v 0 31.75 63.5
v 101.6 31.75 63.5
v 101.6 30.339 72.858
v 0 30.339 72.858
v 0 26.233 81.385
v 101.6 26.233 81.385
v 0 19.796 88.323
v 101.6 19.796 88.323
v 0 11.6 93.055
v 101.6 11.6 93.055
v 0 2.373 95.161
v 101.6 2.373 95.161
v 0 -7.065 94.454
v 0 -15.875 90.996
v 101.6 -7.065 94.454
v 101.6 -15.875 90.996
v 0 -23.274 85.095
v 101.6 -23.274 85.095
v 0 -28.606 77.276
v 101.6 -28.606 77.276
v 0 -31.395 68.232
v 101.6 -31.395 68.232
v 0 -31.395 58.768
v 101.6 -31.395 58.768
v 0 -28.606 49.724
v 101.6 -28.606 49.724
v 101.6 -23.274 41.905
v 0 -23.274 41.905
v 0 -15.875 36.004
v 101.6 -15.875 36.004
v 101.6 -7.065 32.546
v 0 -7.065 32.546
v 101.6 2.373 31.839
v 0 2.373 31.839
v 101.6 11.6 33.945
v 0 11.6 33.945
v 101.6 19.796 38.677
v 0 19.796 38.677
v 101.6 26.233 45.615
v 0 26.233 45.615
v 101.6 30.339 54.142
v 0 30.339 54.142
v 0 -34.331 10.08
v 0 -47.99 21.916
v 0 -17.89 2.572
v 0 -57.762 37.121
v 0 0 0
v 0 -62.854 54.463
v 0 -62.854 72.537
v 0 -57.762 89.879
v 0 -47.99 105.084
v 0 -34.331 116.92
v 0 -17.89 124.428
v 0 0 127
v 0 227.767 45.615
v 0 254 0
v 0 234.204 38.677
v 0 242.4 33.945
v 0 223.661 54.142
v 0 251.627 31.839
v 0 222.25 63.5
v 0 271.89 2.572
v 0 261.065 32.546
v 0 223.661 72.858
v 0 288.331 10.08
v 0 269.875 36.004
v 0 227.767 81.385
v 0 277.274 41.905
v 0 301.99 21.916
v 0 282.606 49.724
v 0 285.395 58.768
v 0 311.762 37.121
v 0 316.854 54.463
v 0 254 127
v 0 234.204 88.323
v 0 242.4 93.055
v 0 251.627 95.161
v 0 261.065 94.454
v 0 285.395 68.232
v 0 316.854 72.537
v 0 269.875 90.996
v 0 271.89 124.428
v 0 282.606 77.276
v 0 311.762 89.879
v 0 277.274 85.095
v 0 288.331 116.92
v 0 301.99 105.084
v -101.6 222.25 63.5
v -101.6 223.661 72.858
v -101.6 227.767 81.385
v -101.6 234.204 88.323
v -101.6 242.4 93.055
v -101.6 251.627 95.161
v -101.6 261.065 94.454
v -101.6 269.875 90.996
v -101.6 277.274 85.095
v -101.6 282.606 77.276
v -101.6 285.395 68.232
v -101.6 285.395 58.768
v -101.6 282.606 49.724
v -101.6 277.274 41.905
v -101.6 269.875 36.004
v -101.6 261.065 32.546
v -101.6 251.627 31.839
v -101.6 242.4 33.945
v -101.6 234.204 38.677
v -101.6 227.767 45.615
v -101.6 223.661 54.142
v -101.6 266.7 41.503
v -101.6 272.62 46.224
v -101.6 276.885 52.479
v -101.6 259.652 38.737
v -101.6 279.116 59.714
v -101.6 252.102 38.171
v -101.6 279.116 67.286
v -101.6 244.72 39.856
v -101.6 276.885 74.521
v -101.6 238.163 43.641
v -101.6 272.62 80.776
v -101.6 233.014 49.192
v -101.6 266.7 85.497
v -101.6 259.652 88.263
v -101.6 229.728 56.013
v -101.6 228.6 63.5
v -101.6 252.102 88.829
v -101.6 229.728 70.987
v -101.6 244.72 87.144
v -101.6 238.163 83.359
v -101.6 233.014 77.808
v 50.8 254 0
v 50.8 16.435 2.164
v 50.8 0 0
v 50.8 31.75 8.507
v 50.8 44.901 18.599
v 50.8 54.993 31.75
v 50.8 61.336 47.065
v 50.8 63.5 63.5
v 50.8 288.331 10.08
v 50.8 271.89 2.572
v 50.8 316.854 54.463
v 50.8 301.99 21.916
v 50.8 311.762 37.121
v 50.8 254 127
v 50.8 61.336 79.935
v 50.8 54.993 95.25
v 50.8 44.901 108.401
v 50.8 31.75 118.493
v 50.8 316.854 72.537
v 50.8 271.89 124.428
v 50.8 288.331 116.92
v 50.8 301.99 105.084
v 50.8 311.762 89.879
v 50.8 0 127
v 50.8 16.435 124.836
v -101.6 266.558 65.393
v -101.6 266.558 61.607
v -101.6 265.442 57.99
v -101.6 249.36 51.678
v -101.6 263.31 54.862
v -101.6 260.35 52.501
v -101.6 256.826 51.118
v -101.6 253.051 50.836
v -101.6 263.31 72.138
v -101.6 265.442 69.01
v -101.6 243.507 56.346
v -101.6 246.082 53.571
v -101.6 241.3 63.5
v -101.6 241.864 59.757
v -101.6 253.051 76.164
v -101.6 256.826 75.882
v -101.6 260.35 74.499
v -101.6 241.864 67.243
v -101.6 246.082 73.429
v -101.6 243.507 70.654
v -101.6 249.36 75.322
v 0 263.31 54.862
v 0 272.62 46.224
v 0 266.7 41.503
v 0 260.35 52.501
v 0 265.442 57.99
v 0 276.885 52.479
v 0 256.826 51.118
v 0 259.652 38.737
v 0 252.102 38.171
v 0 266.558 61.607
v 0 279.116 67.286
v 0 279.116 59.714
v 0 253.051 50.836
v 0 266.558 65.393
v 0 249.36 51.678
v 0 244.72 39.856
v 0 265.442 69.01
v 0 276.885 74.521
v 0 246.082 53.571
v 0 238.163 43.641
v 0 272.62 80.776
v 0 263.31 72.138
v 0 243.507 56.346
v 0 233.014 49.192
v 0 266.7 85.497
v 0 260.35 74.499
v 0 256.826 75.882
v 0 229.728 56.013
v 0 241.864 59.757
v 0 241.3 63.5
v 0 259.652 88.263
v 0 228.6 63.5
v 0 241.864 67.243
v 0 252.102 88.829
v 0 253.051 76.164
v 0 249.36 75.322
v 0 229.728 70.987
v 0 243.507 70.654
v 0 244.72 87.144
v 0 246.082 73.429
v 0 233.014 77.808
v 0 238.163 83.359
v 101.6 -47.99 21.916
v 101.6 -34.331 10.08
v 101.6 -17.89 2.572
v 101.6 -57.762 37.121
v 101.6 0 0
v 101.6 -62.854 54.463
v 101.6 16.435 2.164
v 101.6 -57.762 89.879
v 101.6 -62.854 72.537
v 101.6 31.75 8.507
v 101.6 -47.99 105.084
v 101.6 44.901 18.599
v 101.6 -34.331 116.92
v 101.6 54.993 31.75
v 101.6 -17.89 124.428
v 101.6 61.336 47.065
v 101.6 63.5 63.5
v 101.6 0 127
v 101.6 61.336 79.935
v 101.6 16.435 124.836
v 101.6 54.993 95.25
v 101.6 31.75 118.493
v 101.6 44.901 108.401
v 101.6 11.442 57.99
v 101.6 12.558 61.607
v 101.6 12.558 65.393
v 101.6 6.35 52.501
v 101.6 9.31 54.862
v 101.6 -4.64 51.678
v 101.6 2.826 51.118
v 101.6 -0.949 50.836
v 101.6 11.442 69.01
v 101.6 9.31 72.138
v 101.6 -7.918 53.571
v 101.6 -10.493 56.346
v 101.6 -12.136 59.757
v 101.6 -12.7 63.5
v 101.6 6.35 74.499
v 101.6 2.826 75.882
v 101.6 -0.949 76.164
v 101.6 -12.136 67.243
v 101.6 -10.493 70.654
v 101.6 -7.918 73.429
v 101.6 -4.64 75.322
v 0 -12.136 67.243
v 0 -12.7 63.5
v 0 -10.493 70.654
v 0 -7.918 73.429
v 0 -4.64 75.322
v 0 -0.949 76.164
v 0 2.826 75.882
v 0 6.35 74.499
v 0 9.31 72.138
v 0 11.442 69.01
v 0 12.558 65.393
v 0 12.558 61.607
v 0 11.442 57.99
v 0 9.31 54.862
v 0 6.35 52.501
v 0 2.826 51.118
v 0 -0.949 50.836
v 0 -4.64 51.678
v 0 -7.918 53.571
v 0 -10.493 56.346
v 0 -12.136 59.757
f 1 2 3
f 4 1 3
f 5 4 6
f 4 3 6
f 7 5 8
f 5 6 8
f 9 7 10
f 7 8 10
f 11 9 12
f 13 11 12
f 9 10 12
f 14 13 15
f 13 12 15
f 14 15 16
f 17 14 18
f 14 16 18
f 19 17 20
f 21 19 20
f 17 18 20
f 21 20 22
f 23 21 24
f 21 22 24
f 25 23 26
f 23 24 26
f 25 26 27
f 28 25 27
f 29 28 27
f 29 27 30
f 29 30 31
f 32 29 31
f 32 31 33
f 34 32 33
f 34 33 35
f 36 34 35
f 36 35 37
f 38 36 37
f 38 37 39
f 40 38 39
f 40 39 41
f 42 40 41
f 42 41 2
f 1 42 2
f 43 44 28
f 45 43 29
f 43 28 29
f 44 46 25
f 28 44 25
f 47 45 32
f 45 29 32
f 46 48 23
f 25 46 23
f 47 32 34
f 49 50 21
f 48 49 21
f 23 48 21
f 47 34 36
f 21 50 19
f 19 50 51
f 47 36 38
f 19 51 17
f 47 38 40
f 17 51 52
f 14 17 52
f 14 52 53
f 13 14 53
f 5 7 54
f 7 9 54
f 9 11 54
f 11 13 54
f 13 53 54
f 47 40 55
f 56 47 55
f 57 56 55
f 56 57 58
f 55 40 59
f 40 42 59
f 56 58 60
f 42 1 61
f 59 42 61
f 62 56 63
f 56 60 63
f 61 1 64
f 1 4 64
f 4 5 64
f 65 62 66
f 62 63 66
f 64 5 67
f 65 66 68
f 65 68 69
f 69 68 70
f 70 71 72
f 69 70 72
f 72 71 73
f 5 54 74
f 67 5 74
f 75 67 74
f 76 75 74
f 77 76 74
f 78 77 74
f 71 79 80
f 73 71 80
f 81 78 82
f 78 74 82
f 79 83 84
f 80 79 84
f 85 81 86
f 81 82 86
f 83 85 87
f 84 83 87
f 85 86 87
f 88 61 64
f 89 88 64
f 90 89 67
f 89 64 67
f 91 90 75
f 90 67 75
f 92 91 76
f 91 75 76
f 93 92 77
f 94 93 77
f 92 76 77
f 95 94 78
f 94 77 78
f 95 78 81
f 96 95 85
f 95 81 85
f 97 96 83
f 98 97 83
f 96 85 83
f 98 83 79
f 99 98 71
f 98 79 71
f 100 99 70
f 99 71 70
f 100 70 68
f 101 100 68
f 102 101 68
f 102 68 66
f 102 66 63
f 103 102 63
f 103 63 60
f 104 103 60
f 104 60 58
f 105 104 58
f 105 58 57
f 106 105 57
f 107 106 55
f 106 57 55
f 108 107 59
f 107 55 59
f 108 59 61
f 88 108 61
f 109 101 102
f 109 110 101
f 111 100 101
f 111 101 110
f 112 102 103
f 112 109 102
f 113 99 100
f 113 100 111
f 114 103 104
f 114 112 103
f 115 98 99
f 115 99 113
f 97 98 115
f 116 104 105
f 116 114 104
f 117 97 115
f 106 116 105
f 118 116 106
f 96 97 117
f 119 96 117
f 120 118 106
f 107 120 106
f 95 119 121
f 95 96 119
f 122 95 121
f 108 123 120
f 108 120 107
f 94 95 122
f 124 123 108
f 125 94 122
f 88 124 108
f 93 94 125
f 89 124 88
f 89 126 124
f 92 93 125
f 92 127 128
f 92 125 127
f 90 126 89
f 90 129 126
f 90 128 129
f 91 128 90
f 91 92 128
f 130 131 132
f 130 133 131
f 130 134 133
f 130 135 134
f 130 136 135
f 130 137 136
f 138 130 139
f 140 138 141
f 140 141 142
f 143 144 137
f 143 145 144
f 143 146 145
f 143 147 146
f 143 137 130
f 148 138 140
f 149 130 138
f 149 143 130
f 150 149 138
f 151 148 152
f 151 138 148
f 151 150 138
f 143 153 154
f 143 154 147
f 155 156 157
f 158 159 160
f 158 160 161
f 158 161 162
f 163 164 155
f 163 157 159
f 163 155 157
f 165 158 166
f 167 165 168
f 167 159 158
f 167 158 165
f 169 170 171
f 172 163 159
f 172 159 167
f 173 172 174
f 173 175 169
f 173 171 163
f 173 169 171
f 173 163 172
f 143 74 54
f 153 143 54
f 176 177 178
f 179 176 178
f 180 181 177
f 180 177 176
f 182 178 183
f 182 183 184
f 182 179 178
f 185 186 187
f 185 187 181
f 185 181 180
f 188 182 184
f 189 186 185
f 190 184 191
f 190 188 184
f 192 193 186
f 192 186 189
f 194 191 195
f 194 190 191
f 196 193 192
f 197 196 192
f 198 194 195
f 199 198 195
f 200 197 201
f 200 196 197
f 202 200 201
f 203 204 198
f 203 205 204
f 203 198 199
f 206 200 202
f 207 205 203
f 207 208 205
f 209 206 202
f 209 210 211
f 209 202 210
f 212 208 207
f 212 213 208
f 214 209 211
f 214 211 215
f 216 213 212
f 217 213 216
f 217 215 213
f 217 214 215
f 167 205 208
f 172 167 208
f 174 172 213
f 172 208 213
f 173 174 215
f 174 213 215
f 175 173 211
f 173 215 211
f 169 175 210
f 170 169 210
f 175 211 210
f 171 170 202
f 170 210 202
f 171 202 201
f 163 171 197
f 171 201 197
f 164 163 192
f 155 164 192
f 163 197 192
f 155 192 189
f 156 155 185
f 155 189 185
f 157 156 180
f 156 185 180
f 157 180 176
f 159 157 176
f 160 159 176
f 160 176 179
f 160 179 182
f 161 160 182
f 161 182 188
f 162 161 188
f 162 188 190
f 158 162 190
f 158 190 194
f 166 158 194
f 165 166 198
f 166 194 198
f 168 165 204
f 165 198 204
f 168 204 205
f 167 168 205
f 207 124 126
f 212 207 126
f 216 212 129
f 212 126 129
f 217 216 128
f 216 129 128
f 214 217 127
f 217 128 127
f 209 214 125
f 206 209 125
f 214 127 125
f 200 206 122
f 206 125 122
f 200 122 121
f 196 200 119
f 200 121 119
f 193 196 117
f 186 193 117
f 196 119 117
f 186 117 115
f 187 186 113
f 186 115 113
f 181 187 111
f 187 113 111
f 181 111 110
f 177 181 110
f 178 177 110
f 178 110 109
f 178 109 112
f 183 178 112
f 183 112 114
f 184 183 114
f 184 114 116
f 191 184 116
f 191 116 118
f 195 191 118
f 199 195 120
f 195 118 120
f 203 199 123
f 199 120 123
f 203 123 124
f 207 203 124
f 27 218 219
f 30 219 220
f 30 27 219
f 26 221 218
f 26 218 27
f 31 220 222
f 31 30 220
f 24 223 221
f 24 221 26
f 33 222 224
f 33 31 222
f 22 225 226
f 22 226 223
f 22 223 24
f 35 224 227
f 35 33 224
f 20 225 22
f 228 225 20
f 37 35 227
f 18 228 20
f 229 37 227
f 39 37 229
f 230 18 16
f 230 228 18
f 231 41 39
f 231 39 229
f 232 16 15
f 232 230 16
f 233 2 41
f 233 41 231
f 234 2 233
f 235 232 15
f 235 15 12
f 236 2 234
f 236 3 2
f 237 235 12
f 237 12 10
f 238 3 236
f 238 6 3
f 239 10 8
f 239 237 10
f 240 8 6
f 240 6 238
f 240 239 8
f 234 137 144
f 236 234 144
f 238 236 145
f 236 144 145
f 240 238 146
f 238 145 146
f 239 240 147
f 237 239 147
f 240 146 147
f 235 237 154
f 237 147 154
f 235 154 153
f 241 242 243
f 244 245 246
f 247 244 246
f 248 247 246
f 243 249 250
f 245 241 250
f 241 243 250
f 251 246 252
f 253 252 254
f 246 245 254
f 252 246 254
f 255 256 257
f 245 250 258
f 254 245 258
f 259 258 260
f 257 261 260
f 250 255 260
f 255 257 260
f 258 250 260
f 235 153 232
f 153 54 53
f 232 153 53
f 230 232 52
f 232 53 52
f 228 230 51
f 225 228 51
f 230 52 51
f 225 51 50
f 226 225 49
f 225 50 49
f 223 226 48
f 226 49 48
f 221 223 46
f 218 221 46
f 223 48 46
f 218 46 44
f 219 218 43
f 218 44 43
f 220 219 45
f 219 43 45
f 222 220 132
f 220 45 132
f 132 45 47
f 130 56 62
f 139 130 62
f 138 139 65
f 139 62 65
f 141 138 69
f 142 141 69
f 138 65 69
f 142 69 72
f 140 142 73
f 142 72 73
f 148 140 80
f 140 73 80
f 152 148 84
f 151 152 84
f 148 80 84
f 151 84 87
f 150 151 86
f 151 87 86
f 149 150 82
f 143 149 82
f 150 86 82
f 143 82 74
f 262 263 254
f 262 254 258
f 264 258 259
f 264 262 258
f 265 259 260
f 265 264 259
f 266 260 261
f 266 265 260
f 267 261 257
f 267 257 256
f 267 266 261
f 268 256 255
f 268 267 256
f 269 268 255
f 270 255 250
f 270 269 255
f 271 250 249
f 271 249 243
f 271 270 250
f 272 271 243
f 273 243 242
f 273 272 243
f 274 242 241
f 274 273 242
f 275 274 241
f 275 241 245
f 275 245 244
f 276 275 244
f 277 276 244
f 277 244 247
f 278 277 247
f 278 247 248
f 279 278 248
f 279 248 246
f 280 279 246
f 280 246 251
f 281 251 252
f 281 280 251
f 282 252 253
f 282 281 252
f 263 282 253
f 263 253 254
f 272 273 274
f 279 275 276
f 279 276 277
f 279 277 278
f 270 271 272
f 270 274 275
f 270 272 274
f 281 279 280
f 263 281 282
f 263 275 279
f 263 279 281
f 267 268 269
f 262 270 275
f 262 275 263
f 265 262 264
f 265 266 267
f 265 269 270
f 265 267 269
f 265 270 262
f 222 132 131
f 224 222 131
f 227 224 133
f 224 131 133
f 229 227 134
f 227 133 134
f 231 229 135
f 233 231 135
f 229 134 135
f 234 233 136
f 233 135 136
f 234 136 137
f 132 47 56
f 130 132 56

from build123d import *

# Parameters (mm, degrees)
F1_DEPTH  = 50.8
F3_DEPTH  = 50.8
F4_R      = 31.75
F5_DEPTH  = 101.601
F6_R      = 31.75
F7_DEPTH  = 101.6
F8_R      = 25.4
F9_DEPTH  = 101.6
F10_R     = 12.7
F11_DEPTH = 101.6
F12_R     = 12.7
F13_DEPTH = 101.6


with BuildPart() as f1:
    # F0 (on Right) → F1 (new body)
    with BuildSketch(Plane.YZ):
        with BuildLine():
            ThreePointArc((0, 127), (-63.5, 63.5), (0, 0))
            Line((0, 0), (254, 0))
            ThreePointArc((254, 0), (317.5, 63.5), (254, 127))
            Line((254, 127), (0, 127))
        make_face()
    extrude(amount=F1_DEPTH)

    # F2 (on face) → F3 (join)
    with BuildSketch(Plane.YZ.offset(50.8)):
        with BuildLine():
            ThreePointArc((0, 0), (44.901281, 18.598719), (63.5, 63.5))
            ThreePointArc((63.5, 63.5), (44.901281, 108.401281), (0, 127))
            ThreePointArc((0, 127), (-63.5, 63.5), (0, 0))
        make_face()
    extrude(amount=F3_DEPTH)

    # F4 (on face) → F5 (cut, through all)
    with BuildSketch(Plane.YZ.offset(101.6)):
        with Locations((0, 63.5)):
            Circle(F4_R)
    extrude(amount=-F5_DEPTH, mode=Mode.SUBTRACT)

    # F6 (on face) → F7 (join)
    with BuildSketch(Plane(origin=(0, 0, 0), x_dir=(0, -1, 0), z_dir=(-1, 0, 0))):
        with Locations((-254, 63.5)):
            Circle(F6_R)
    extrude(amount=F7_DEPTH)

    # F8 (on face) → F9 (cut, through all)
    with BuildSketch(Plane(origin=(-101.6, 0, 0), x_dir=(0, -1, 0), z_dir=(-1, 0, 0))):
        with Locations((-254, 63.5)):
            Circle(F8_R)
    extrude(amount=-F9_DEPTH, mode=Mode.SUBTRACT)

    # F10 (on face) → F11 (join)
    with BuildSketch(Plane(origin=(0, 0, 0), x_dir=(0, -1, 0), z_dir=(-1, 0, 0))):
        with Locations((-254, 63.5)):
            Circle(F10_R)
    extrude(amount=F11_DEPTH)


with BuildPart() as f13:
    # F12 (on face) → F13 (new body)
    with BuildSketch(Plane(origin=(0, 0, 0), x_dir=(0, -1, 0), z_dir=(-1, 0, 0))):
        with Locations((0, 63.5)):
            Circle(F12_R)
    extrude(amount=-F13_DEPTH)


solid = Compound([f1.part, f13.part])
